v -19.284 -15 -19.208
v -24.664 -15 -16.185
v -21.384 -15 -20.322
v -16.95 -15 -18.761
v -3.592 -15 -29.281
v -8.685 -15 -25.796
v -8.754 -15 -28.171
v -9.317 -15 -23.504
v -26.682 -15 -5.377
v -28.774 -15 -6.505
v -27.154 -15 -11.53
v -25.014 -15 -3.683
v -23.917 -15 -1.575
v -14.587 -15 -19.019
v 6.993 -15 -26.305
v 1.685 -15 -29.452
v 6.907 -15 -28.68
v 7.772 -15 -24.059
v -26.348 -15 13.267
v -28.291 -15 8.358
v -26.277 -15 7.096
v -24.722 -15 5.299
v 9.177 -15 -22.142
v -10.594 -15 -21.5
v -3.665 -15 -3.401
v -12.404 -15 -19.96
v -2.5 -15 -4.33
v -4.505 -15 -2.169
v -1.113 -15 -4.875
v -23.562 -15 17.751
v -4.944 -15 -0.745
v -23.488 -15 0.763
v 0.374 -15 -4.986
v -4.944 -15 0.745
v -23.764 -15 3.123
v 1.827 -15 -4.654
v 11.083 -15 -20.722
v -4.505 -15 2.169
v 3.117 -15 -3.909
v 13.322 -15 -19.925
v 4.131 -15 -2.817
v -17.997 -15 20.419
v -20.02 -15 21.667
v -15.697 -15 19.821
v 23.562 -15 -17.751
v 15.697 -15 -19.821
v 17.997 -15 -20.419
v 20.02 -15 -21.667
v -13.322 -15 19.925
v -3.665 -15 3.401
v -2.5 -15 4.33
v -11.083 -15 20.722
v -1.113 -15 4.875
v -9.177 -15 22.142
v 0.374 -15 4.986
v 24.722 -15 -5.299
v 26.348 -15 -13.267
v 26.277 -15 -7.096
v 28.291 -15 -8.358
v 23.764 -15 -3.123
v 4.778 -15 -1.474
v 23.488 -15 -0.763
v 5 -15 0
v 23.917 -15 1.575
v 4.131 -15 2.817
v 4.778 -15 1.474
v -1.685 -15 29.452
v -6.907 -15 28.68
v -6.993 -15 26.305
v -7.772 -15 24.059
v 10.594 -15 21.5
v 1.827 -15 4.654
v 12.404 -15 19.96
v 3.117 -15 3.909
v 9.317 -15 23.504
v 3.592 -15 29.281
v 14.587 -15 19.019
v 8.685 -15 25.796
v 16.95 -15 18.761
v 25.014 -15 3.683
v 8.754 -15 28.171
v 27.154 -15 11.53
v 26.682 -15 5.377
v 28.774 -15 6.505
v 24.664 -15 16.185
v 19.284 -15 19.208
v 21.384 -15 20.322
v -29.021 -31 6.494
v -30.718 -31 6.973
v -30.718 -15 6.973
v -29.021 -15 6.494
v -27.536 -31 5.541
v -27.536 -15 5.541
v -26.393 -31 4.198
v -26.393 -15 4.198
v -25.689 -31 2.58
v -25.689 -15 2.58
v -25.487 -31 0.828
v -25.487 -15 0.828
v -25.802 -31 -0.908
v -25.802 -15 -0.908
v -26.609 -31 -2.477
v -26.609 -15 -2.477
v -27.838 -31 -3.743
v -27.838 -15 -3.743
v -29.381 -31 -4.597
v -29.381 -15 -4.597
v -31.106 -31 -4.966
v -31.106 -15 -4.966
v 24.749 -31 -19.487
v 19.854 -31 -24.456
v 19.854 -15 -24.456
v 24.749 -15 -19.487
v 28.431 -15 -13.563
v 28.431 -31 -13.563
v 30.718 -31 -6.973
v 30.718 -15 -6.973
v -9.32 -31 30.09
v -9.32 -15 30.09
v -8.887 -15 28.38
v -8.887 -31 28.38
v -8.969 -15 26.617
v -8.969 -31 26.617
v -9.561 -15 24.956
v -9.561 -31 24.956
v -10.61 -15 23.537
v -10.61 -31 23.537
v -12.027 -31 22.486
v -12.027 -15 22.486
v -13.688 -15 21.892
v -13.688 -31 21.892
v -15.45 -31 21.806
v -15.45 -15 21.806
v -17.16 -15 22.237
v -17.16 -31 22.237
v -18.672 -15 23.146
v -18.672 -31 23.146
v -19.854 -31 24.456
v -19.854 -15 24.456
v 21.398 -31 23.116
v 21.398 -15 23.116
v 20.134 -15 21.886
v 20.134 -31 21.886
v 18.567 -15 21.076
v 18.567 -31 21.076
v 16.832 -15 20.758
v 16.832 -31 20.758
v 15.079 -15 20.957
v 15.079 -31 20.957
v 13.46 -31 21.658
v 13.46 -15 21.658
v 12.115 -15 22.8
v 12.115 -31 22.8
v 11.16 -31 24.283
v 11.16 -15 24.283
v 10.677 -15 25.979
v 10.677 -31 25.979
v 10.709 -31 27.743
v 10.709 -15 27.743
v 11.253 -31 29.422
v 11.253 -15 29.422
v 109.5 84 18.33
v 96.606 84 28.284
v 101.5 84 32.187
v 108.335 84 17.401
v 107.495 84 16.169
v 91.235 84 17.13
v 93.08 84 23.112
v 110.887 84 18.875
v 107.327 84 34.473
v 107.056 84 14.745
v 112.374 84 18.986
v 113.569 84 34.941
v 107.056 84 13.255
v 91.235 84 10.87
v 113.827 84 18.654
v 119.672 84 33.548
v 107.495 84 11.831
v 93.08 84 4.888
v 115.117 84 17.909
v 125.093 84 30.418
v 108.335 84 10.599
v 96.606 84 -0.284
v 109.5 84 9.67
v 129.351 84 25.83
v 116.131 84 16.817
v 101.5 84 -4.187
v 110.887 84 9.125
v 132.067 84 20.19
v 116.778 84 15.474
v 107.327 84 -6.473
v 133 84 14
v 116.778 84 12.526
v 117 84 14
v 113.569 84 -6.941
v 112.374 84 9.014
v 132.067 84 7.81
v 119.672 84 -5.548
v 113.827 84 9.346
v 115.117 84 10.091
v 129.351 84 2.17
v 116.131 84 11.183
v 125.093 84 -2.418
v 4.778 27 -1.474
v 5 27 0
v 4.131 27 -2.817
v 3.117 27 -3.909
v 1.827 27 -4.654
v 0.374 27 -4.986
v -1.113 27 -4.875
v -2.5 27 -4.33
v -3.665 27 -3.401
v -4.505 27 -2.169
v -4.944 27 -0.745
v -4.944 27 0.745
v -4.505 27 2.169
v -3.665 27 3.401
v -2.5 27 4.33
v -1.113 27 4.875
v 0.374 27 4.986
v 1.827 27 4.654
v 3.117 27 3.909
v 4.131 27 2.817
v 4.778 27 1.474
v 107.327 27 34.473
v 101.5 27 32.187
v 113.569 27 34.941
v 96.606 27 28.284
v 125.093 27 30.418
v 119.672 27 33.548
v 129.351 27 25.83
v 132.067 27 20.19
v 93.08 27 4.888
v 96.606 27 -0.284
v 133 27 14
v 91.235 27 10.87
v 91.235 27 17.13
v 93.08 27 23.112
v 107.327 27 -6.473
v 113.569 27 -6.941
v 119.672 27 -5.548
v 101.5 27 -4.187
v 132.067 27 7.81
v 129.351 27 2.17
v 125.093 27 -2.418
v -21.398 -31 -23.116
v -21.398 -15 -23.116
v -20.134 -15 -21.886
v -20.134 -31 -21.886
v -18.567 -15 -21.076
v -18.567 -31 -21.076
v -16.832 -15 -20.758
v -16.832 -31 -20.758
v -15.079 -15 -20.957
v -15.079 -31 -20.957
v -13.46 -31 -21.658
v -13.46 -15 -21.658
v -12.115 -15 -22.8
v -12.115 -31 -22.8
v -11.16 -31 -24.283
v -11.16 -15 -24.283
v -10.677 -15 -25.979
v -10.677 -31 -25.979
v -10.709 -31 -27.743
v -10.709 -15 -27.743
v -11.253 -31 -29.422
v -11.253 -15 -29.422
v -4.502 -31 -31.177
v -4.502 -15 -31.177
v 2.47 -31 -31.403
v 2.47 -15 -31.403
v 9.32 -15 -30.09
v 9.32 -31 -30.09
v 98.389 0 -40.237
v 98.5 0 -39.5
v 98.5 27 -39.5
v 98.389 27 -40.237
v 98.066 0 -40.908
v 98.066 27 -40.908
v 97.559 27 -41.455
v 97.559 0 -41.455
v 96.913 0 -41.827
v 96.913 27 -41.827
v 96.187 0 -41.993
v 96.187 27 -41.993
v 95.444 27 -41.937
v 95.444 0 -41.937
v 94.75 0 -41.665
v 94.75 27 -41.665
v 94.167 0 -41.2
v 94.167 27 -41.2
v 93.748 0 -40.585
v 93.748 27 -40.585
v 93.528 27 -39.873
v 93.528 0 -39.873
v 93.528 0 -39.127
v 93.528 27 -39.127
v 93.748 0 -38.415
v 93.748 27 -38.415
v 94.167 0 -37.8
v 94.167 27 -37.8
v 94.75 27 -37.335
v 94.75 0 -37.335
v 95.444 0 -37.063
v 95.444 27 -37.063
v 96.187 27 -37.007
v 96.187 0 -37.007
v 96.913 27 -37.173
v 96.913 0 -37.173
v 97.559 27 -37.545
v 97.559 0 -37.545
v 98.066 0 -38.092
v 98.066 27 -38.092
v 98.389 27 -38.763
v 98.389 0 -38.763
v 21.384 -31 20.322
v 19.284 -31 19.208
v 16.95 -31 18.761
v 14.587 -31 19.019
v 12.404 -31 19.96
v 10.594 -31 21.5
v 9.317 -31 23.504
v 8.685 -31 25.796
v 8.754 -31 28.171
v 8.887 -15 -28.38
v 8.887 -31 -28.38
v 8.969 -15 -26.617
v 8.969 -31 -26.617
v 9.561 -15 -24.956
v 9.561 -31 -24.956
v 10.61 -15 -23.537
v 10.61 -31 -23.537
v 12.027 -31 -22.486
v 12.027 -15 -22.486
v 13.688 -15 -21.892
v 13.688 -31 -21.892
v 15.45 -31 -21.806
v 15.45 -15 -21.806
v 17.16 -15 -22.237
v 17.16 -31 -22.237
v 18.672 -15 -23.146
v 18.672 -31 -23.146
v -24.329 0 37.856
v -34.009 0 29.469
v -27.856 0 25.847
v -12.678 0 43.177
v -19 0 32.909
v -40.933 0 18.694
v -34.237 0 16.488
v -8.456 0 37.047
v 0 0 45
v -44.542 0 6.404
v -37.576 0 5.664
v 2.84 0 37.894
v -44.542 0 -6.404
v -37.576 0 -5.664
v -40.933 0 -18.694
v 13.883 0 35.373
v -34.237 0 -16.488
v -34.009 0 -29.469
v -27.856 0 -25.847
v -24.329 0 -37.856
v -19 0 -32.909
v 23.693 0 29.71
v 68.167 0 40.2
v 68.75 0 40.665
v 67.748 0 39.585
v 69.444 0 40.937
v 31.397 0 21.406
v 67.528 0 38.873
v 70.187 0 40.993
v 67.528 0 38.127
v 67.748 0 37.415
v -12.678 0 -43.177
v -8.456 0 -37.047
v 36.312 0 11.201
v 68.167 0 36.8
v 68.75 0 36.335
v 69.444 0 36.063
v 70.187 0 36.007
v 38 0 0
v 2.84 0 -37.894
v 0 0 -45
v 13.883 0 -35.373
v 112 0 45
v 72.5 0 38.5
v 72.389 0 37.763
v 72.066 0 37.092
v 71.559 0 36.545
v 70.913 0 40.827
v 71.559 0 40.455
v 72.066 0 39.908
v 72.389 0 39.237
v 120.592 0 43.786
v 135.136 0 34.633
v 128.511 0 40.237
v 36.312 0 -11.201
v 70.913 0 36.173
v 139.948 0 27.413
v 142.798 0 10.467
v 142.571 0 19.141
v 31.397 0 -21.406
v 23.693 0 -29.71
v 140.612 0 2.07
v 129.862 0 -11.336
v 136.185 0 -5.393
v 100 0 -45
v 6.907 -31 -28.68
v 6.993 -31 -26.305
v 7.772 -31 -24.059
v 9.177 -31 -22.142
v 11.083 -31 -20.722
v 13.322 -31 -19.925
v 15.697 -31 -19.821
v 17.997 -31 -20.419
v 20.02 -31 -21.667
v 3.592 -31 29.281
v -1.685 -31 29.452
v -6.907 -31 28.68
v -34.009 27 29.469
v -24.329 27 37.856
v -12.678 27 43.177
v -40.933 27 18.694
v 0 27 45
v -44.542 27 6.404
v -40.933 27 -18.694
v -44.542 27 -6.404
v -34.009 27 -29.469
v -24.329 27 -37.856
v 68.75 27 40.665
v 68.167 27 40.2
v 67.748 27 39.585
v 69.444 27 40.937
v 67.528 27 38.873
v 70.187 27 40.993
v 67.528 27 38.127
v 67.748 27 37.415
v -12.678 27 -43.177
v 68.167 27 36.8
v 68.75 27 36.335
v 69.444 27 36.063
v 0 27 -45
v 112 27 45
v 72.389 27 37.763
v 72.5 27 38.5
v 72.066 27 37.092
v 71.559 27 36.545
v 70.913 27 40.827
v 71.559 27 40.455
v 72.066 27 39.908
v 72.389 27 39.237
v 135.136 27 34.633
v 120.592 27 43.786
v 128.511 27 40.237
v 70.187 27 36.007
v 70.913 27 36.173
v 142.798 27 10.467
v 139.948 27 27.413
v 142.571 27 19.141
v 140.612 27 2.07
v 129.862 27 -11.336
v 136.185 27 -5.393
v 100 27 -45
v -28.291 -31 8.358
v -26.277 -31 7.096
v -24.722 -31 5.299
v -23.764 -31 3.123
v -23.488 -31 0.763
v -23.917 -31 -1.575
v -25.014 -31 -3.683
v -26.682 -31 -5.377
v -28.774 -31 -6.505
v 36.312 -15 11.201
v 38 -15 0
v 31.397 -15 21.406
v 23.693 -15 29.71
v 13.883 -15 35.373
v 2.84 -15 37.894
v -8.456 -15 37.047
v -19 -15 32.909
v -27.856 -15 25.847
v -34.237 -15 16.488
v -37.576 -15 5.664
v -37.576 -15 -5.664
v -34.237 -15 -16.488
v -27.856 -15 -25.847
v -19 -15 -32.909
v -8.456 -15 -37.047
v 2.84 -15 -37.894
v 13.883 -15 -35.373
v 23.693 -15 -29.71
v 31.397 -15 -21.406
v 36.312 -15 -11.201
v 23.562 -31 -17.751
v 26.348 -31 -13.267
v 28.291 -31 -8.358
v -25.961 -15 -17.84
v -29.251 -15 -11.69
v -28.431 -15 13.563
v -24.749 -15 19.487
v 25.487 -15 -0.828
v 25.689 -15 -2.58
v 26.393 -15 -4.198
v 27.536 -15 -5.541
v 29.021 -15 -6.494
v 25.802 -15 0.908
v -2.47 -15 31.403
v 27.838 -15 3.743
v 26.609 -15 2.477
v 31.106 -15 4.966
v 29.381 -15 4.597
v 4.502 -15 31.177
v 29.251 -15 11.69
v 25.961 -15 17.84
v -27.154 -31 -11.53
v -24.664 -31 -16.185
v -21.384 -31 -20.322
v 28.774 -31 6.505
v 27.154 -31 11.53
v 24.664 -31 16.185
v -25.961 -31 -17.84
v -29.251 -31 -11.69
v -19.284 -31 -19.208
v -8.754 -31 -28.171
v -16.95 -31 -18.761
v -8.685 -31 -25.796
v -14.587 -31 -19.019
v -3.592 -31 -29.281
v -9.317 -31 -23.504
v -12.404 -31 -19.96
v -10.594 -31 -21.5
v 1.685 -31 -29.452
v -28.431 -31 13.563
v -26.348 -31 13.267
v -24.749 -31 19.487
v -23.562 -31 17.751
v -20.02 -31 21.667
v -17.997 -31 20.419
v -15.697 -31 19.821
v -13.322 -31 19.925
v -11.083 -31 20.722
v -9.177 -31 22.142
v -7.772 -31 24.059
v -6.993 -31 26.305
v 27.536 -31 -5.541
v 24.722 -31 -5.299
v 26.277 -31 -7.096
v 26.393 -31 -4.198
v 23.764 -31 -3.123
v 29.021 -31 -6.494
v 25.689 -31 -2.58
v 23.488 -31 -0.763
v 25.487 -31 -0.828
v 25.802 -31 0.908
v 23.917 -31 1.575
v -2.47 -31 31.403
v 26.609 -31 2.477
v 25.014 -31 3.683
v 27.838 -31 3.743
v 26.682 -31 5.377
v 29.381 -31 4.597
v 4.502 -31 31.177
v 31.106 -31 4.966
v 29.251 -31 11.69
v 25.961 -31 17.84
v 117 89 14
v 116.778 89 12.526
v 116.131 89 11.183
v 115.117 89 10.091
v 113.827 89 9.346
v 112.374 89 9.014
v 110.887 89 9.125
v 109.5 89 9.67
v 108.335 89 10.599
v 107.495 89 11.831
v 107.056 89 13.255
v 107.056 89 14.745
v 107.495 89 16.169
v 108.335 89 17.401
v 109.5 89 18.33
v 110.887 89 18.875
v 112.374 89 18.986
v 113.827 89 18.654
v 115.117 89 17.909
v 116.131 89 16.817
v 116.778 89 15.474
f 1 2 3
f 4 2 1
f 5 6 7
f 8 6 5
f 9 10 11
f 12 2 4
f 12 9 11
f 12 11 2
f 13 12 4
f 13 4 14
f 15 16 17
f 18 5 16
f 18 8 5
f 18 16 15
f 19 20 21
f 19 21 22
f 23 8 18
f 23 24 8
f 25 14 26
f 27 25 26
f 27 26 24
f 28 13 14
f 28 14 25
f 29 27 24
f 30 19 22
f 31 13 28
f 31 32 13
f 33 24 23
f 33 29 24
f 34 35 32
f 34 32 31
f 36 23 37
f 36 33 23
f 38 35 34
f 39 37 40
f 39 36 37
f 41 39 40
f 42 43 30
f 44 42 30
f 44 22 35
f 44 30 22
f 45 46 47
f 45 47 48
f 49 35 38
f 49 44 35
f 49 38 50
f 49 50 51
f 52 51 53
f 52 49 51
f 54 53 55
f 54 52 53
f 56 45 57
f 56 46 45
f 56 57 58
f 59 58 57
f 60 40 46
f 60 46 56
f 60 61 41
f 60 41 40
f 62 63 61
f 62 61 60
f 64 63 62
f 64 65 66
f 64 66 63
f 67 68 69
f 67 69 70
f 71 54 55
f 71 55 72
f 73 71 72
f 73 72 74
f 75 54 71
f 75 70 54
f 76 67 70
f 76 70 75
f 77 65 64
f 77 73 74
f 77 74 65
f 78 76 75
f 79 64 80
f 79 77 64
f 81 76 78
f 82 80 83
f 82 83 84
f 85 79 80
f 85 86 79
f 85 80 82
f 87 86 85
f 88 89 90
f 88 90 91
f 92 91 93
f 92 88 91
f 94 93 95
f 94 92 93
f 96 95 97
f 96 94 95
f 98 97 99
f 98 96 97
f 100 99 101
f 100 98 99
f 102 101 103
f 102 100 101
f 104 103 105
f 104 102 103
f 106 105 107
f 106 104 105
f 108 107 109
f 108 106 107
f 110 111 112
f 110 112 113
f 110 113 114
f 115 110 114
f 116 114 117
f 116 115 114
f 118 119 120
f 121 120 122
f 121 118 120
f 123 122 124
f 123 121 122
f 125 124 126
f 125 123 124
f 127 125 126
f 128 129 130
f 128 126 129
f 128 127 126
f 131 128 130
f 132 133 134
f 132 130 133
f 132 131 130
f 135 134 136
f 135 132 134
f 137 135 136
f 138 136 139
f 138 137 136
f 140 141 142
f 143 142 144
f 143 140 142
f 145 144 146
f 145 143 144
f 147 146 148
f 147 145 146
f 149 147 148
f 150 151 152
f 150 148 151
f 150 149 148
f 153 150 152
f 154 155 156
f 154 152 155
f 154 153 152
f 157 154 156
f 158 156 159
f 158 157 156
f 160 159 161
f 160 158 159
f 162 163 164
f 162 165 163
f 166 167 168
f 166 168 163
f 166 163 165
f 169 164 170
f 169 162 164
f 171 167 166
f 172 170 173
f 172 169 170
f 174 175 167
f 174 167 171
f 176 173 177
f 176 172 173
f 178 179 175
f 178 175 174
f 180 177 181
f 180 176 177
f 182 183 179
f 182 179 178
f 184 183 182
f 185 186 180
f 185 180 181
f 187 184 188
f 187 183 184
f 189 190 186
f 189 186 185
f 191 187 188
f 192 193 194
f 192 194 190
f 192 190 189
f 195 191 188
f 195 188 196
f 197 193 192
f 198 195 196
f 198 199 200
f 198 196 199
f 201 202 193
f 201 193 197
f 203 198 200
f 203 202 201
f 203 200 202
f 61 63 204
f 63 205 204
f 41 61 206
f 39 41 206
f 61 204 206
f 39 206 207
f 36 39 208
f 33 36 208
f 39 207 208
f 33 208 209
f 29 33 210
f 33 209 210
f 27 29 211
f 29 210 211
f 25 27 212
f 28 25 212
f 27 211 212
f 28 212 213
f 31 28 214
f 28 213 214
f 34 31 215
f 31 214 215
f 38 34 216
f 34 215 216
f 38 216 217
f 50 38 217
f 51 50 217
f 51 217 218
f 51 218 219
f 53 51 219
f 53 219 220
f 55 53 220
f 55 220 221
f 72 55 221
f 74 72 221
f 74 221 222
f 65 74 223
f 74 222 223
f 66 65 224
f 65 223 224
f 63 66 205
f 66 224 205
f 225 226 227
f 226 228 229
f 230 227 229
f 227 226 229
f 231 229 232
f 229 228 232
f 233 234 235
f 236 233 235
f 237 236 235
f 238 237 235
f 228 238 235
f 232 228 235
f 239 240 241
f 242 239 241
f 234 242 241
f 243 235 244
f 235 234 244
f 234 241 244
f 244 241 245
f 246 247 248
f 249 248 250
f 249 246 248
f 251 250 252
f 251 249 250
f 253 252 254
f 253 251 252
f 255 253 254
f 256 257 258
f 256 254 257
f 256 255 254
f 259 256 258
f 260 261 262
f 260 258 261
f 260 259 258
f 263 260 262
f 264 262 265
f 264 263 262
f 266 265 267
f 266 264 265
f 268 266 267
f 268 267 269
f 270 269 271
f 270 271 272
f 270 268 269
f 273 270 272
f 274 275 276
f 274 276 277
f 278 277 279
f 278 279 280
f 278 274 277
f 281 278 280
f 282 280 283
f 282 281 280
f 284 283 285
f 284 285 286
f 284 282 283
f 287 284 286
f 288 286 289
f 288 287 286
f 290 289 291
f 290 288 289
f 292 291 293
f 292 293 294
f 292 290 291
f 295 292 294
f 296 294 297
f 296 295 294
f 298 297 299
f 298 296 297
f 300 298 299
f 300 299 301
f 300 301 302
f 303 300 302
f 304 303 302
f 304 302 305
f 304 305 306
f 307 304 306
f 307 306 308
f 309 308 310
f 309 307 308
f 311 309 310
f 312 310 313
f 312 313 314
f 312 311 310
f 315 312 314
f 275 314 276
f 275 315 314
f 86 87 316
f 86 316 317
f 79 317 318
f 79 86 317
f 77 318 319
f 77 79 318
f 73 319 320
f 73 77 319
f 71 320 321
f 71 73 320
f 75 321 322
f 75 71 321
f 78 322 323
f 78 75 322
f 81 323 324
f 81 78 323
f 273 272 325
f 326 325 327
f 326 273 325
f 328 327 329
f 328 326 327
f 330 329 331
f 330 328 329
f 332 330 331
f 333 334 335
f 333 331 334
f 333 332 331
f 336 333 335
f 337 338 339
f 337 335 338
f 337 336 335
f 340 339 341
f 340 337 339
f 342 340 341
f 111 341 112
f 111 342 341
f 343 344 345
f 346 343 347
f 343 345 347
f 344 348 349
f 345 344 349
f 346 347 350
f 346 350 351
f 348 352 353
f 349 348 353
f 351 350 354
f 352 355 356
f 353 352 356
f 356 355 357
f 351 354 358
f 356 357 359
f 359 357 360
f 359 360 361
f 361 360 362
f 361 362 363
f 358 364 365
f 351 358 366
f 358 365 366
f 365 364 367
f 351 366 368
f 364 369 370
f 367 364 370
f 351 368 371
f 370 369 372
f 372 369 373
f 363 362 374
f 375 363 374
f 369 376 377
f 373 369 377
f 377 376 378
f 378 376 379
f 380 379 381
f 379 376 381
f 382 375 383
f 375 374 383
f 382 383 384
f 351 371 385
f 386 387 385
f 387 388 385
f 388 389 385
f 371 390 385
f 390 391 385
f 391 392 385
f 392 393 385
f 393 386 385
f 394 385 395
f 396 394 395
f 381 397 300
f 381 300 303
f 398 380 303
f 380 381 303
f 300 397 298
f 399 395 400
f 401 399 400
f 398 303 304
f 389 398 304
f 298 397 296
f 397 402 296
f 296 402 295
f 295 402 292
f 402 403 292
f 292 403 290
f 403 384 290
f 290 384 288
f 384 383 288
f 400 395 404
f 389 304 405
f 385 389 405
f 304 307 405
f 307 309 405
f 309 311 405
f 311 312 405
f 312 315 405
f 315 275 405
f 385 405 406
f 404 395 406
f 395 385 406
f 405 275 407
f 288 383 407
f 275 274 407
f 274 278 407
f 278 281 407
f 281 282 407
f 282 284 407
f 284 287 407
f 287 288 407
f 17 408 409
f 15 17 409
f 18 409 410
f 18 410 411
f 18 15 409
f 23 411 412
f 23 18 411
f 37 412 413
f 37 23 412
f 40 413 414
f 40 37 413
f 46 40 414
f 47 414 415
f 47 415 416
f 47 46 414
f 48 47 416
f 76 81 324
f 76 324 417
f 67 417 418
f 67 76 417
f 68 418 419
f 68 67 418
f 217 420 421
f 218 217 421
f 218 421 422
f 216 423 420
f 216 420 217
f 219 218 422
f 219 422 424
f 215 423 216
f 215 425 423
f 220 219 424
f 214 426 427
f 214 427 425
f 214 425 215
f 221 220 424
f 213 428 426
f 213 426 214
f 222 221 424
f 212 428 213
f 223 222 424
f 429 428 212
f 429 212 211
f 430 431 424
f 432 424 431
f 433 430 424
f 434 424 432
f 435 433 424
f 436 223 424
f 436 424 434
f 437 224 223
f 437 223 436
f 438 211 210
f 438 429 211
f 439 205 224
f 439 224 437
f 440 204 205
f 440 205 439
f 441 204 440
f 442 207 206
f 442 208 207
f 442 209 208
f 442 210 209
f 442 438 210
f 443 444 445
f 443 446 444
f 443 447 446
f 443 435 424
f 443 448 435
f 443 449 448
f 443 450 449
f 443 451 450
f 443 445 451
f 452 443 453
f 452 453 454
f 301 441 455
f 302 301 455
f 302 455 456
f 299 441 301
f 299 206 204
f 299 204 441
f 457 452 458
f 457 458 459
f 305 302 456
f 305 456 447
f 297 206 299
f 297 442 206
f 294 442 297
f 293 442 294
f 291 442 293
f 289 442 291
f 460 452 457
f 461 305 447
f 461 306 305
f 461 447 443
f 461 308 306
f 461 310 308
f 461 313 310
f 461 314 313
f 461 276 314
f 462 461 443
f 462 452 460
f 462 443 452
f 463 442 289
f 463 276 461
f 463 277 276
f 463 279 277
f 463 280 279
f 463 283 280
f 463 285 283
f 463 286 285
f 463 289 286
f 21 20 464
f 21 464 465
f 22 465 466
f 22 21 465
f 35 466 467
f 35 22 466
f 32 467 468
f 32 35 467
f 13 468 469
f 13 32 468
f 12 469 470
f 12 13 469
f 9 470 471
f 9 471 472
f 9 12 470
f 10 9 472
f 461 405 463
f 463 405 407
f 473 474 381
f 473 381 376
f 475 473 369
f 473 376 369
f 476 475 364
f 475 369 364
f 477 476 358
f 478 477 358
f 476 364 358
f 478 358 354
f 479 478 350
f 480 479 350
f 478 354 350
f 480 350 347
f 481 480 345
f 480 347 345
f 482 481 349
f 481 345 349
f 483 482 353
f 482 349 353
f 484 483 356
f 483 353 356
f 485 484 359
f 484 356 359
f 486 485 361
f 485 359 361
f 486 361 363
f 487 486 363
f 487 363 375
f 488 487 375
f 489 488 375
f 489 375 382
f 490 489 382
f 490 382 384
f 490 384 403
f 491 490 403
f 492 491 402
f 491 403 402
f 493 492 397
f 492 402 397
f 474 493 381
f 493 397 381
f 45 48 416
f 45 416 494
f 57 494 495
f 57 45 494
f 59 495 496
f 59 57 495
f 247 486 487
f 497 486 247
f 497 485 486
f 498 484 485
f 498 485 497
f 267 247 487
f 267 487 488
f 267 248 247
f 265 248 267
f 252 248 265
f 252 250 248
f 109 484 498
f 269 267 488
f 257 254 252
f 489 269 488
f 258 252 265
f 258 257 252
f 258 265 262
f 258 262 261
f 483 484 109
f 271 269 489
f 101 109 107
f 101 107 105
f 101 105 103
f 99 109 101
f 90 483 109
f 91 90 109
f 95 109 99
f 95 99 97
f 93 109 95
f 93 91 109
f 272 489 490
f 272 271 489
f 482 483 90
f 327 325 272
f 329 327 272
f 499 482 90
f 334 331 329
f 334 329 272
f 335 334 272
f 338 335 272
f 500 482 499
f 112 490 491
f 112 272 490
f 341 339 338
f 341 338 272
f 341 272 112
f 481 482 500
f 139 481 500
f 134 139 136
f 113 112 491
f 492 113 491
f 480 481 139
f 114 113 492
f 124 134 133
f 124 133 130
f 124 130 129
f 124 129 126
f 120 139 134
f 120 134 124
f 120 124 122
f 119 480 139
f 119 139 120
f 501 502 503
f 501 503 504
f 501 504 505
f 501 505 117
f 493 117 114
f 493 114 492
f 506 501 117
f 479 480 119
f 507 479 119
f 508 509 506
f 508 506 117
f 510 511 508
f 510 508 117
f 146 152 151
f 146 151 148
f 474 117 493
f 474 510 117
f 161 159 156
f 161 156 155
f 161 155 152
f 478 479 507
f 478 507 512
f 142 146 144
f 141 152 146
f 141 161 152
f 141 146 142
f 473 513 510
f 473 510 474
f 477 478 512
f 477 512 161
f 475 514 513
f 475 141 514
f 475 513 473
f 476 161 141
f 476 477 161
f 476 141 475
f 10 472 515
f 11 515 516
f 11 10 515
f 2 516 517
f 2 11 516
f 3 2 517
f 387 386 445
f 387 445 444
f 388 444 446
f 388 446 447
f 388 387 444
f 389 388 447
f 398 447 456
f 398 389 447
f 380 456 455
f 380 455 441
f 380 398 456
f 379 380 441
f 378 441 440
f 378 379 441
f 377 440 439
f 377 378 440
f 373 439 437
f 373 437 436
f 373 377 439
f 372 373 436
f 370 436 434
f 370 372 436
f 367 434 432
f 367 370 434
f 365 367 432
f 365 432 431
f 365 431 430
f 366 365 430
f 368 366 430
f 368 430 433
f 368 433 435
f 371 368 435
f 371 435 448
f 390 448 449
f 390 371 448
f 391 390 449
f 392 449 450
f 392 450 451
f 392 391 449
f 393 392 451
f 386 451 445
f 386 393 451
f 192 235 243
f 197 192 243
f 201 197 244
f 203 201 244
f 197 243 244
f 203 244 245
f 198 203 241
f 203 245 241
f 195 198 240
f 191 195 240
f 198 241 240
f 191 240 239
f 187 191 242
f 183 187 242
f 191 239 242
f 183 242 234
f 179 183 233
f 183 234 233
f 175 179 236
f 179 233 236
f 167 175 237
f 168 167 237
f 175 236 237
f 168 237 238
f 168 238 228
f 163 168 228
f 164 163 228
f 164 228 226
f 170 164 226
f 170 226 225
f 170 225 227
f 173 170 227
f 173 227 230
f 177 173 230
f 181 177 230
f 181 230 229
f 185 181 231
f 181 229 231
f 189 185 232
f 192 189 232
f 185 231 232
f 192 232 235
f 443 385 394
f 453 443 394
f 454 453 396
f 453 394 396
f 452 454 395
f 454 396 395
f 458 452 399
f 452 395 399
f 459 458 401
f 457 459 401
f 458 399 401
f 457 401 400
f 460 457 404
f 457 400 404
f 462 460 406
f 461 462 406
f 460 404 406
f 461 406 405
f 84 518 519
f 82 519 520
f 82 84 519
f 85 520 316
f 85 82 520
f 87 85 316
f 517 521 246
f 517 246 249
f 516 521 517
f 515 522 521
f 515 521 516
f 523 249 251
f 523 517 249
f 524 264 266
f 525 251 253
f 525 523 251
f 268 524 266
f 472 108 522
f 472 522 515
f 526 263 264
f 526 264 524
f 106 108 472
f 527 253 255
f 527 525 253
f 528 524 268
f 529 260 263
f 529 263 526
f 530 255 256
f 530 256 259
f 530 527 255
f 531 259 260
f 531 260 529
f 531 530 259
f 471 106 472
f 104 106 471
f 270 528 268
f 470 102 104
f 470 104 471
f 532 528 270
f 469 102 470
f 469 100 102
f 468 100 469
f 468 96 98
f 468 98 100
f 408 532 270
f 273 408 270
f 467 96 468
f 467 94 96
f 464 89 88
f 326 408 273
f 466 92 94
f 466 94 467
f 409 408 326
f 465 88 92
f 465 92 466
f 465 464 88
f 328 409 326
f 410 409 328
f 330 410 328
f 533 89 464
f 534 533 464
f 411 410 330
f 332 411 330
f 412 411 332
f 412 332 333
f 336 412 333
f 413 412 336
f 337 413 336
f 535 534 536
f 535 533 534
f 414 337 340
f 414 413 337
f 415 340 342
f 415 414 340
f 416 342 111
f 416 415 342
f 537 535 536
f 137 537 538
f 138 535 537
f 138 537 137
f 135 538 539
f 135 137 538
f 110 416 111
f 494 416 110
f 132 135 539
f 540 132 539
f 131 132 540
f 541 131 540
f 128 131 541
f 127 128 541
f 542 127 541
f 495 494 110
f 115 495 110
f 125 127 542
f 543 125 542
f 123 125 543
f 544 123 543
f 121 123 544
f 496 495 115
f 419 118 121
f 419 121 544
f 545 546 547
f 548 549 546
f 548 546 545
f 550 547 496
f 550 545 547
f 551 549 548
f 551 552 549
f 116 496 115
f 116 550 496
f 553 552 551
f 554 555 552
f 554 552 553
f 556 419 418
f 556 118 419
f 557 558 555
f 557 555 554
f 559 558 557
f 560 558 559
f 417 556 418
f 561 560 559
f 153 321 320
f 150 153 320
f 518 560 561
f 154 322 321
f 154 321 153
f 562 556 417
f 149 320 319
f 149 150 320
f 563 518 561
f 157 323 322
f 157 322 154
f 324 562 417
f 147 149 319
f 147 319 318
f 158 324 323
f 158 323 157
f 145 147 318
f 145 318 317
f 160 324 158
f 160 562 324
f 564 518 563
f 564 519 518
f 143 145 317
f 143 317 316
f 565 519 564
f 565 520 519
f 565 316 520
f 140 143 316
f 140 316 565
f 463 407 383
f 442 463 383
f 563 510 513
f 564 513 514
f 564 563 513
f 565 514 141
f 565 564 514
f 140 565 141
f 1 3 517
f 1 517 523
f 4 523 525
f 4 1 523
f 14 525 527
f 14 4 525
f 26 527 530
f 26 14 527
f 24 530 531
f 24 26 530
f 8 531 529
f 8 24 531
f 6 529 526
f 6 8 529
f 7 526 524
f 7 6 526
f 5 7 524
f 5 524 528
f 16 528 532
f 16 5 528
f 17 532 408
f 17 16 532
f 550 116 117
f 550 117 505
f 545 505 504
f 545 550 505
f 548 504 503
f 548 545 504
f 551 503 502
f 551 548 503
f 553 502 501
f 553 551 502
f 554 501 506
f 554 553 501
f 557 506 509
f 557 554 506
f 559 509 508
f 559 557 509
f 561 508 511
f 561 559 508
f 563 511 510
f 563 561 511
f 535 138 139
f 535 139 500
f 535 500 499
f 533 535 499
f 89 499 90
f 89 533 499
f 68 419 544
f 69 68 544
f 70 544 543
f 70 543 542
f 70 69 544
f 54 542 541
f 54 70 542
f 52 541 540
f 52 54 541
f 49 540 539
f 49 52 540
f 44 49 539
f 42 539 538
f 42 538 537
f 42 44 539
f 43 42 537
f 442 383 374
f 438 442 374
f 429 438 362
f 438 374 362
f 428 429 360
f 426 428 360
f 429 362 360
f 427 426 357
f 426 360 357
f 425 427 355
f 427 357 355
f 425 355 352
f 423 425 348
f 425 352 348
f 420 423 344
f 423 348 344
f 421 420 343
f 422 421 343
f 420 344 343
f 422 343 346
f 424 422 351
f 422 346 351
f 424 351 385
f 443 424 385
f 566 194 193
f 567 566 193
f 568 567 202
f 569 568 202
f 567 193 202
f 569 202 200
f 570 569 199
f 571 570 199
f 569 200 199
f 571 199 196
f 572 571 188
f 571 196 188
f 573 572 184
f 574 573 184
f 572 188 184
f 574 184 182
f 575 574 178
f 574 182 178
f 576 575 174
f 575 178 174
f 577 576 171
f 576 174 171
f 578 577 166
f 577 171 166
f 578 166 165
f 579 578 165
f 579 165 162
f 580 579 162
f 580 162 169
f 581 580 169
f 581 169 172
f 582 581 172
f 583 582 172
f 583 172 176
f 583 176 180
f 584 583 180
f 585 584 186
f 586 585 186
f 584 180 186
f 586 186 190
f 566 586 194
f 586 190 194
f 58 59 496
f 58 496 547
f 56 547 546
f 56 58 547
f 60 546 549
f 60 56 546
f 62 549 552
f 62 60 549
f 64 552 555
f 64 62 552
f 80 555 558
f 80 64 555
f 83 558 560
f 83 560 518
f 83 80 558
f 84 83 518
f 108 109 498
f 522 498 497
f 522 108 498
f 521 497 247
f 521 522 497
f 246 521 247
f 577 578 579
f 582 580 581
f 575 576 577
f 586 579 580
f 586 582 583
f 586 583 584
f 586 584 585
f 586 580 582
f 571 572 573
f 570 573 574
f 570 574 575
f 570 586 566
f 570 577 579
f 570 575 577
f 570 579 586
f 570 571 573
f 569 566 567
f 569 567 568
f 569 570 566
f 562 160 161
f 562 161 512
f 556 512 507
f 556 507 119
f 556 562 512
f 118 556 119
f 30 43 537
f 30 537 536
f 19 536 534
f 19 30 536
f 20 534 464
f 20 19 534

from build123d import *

# Parameters (mm, degrees)
SKETCH1_R                = 2.5
SKETCH1_R_2              = 5
BOSS_EXTRUDE1_DEPTH      = 27
SKETCH2_R                = 21
BOSS_EXTRUDE2_DEPTH      = 57
SKETCH4_R                = 38
SKETCH4_R_2              = 33
BOSS_EXTRUDE3_DEPTH      = 15
BOSS_EXTRUDE4_DEPTH      = 16
BOSS_EXTRUDE4_DEPTH_BACK = 15
SKETCH6_R                = 5
BOSS_EXTRUDE5_DEPTH      = 5
SKETCH7_R                = 33
BOSS_EXTRUDE6_DEPTH      = 15
SKETCH8_R                = 5
CUT_EXTRUDE1_DEPTH       = 87


with BuildPart() as part:
    # Sketch1 → Boss-Extrude1 (new body)
    with BuildSketch(Plane(origin=(0, 0, 0), x_dir=(1, 0, 0), z_dir=(0, 1, 0))):
        with BuildLine():
            Line((100, 45), (0, 45))
            ThreePointArc((0, 45), (-45, 0), (0, -45))
            Line((0, -45), (112, -45))
            ThreePointArc((112, -45), (141.550203848, -23.369389122), (129.862410225, 11.336422419))
            Line((129.862410225, 11.336422419), (100, 45))
        make_face()
        with Locations((70, -38.5)):
            Circle(SKETCH1_R, mode=Mode.SUBTRACT)
        with Locations((96, 39.5)):
            Circle(SKETCH1_R, mode=Mode.SUBTRACT)
        Circle(SKETCH1_R_2, mode=Mode.SUBTRACT)
    extrude(amount=BOSS_EXTRUDE1_DEPTH)

    # Sketch4 → Boss-Extrude3 (add)
    with BuildSketch(Plane.XZ):
        Circle(SKETCH4_R)
        Circle(SKETCH4_R_2, mode=Mode.SUBTRACT)
    extrude(amount=BOSS_EXTRUDE3_DEPTH)

    # Sketch5 → Boss-Extrude4 (add, two sides)
    with BuildSketch(Plane.XZ.offset(15)) as boss_extrude4_sk:
        with BuildLine():
            ThreePointArc((31.106124527, 4.96578462), (27.77659984, 14.856328662), (21.39833694, 23.116253507))
            ThreePointArc((21.39833694, 23.116253507), (13.460014521, 21.658208815), (11.252566633, 29.421586364))
            ThreePointArc((11.252566633, 29.421586364), (1.022341892, 31.483405423), (-9.320094308, 30.089630142))
            ThreePointArc((-9.320094308, 30.089630142), (-12.026551774, 22.485818918), (-19.853557895, 24.455801744))
            ThreePointArc((-19.853557895, 24.455801744), (-26.754257948, 16.627076761), (-30.718431248, 6.973376635))
            ThreePointArc((-30.718431248, 6.973376635), (-25.486566295, 0.827610103), (-31.106124527, -4.96578462))
            ThreePointArc((-31.106124527, -4.96578462), (-27.77659984, -14.856328662), (-21.39833694, -23.116253507))
            ThreePointArc((-21.39833694, -23.116253507), (-13.460014521, -21.658208815), (-11.252566633, -29.421586364))
            ThreePointArc((-11.252566633, -29.421586364), (-1.022341892, -31.483405423), (9.320094308, -30.089630142))
            ThreePointArc((9.320094308, -30.089630142), (12.026551774, -22.485818918), (19.853557895, -24.455801744))
            ThreePointArc((19.853557895, -24.455801744), (26.754257948, -16.627076761), (30.718431248, -6.973376635))
            ThreePointArc((30.718431248, -6.973376635), (25.486566295, -0.827610103), (31.106124527, 4.96578462))
        make_face()
        with BuildLine():
            ThreePointArc((20.020308468, -21.666500614), (25.055574904, -15.571389348), (28.291265465, -8.357888394))
            ThreePointArc((28.291265465, -8.357888394), (23.487619919, -0.762699507), (28.773894177, 6.504845418))
            ThreePointArc((28.773894177, 6.504845418), (26.0130062, 13.913069699), (21.383776403, 20.322010401))
            ThreePointArc((21.383776403, 20.322010401), (12.404327108, 19.959525771), (8.753585708, 28.171346032))
            ThreePointArc((8.753585708, 28.171346032), (0.957431296, 29.484459047), (-6.907489061, 28.679898795))
            ThreePointArc((-6.907489061, 28.679898795), (-11.083292811, 20.722225278), (-20.020308468, 21.666500614))
            ThreePointArc((-20.020308468, 21.666500614), (-25.055574904, 15.571389348), (-28.291265465, 8.357888394))
            ThreePointArc((-28.291265465, 8.357888394), (-23.487619919, 0.762699507), (-28.773894177, -6.504845418))
            ThreePointArc((-28.773894177, -6.504845418), (-26.0130062, -13.913069699), (-21.383776403, -20.322010401))
            ThreePointArc((-21.383776403, -20.322010401), (-12.404327108, -19.959525771), (-8.753585708, -28.171346032))
            ThreePointArc((-8.753585708, -28.171346032), (-0.957431296, -29.484459047), (6.907489061, -28.679898795))
            ThreePointArc((6.907489061, -28.679898795), (11.083292811, -20.722225278), (20.020308468, -21.666500614))
        make_face(mode=Mode.SUBTRACT)
    extrude(amount=BOSS_EXTRUDE4_DEPTH)
    extrude(boss_extrude4_sk.sketch, amount=-BOSS_EXTRUDE4_DEPTH_BACK)

    # Sketch7 → Boss-Extrude6 (add)
    with BuildSketch(Plane.XZ):
        Circle(SKETCH7_R)
    extrude(amount=BOSS_EXTRUDE6_DEPTH)

    # Sketch8 → Cut-Extrude1 (cut)
    with BuildSketch(Plane(origin=(0, 27, 0), x_dir=(1, 0, 0), z_dir=(0, 1, 0))):
        Circle(SKETCH8_R)
    extrude(amount=-CUT_EXTRUDE1_DEPTH, mode=Mode.SUBTRACT)


with BuildPart() as body_2:
    # Sketch2 → Boss-Extrude2 (new body)
    with BuildSketch(Plane(origin=(0, 27, 0), x_dir=(1, 0, 0), z_dir=(0, 1, 0))):
        with Locations((112, -14)):
            Circle(SKETCH2_R)
    extrude(amount=BOSS_EXTRUDE2_DEPTH)

    # Sketch6 → Boss-Extrude5 (add)
    with BuildSketch(Plane(origin=(0, 84, 0), x_dir=(1, 0, 0), z_dir=(0, 1, 0))):
        with Locations((112, -14)):
            Circle(SKETCH6_R)
    extrude(amount=BOSS_EXTRUDE5_DEPTH)


solid = Compound([part.part, body_2.part])
